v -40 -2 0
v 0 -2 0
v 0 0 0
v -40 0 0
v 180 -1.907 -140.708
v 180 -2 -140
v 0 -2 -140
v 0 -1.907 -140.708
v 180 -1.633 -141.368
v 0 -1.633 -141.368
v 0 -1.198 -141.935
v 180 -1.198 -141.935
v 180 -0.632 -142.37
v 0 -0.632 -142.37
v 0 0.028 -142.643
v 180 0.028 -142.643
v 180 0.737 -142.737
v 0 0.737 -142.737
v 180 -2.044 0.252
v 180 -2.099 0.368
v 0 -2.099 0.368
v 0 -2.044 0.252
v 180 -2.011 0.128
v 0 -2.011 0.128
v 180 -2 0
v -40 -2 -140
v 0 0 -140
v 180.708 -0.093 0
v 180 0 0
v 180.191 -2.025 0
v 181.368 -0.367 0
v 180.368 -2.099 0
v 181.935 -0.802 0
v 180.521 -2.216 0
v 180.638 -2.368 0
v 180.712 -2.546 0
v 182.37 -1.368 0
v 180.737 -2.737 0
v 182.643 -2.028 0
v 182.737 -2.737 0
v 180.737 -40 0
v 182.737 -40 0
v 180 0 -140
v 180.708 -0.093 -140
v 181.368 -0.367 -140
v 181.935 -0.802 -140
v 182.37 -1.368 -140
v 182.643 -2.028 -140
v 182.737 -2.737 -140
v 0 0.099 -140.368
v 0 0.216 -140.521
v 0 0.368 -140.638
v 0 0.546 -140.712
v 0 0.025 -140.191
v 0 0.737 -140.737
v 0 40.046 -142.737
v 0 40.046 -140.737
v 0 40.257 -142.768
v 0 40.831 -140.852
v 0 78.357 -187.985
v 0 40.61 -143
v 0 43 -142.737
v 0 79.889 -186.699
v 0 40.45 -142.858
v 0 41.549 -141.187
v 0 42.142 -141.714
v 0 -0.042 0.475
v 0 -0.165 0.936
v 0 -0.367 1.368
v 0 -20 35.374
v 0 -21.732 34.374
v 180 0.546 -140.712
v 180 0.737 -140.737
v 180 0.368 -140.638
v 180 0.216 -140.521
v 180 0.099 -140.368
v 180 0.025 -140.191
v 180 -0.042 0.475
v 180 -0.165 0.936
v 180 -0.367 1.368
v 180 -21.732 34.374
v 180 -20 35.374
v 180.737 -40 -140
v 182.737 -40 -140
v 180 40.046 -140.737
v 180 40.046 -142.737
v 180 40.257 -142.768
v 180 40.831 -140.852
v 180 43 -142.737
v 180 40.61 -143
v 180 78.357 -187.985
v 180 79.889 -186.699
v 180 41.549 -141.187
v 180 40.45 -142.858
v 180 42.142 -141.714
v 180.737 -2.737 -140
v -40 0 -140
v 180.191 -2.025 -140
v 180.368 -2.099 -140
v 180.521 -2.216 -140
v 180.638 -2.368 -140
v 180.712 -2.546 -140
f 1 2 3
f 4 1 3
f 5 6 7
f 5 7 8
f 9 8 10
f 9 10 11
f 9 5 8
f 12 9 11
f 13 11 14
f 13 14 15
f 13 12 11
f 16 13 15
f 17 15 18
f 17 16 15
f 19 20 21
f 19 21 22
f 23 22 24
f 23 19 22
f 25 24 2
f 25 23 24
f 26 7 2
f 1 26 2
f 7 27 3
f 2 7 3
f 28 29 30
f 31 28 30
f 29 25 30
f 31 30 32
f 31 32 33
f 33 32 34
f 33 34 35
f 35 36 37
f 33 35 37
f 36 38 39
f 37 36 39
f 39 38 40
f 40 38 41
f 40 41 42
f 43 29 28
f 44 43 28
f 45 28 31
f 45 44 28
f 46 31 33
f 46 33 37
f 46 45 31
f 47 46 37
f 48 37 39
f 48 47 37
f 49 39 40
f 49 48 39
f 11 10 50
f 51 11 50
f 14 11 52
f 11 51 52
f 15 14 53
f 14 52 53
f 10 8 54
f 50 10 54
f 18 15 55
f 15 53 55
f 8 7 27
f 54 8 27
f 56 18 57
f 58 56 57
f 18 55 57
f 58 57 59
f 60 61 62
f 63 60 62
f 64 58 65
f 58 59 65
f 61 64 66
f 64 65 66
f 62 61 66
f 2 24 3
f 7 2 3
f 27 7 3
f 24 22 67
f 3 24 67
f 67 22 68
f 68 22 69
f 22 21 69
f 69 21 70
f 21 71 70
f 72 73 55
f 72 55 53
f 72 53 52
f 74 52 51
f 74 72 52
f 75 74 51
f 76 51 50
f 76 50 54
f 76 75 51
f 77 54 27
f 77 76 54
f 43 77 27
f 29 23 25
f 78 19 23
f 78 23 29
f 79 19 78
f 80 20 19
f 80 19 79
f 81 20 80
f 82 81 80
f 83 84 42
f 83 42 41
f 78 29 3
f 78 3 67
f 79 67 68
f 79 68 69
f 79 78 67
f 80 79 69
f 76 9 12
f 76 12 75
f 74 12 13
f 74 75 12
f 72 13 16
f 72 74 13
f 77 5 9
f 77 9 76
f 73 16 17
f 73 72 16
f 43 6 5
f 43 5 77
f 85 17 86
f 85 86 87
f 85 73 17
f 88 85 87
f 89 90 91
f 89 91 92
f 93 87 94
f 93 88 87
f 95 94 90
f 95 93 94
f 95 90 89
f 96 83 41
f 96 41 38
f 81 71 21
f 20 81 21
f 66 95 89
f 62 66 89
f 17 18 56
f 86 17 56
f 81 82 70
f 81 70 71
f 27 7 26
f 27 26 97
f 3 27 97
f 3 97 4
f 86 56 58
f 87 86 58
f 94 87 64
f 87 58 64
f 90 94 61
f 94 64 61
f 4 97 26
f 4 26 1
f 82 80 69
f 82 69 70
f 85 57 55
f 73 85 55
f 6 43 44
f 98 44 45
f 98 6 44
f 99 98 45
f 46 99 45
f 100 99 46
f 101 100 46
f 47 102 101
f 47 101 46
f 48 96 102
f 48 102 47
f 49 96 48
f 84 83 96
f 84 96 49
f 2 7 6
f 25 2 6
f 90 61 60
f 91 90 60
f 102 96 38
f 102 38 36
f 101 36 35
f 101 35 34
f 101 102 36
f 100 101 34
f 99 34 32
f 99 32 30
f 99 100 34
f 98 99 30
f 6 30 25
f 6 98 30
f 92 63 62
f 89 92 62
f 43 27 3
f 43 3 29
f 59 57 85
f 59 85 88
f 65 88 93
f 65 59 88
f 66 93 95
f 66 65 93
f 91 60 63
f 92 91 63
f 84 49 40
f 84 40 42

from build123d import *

# Parameters (mm, degrees)
SKETCH1_W            = 180
SKETCH1_H            = 140
BASE_FLANGE2_DEPTH   = 2
EDGE_FLANGE3_DEPTH   = 140
SKETCH19_W           = 140
SKETCH19_H           = 2
BOSS_EXTRUDE1_DEPTH  = 40
EDGE_FLANGE4_DEPTH   = 180
EDGE_FLANGE5_DEPTH   = 180
EDGE_FLANGE6_DEPTH   = 180
EDGE_FLANGE6_2_DEPTH = 180


# Read off the part's stored shape, not the designer's step: Edge-Flange6
# Sheet-metal steps are written as plain solids
with BuildPart() as part:
    # Sketch1 → Base-Flange2 (new body)
    with BuildSketch(Plane(origin=(0, 0, 0), x_dir=(1, 0, 0), z_dir=(0, 1, 0))):
        with Locations((90, 70)):
            Rectangle(SKETCH1_W, SKETCH1_H)
    extrude(amount=-BASE_FLANGE2_DEPTH)

    # Edge-Flange3 section (across the edge) → Edge-Flange3 (add)
    with BuildSketch(Plane(origin=(180.7366, -2, -140), x_dir=(-1, 0, 0), z_dir=(0, 0, 1))):
        with BuildLine():
            Line((-2, 0.7366), (-2, 38))
            Line((-2, 38), (0, 38))
            Line((0, 38), (0, 0.7366))
            ThreePointArc((0, 0.7366), (0.215745145, 0.215745145), (0.7366, 0))
            Line((0.7366, 0), (0.7366, -2))
            ThreePointArc((0.7366, -2), (-1.198468417, -1.198468417), (-2, 0.7366))
        make_face()
    extrude(amount=EDGE_FLANGE3_DEPTH)

    # Edge-Flange4 section (across the edge) → Edge-Flange4 (add)
    with BuildSketch(Plane(origin=(180, -2, 0.197371375), x_dir=(0, -0.8660254037844416, -0.49999999999999495), z_dir=(-1, 0, 0))):
        with BuildLine():
            Line((-2, 0.197371375), (-2, 39.464101615))
            Line((-2, 39.464101615), (0, 39.464101615))
            Line((0, 39.464101615), (0, 0.197371375))
            ThreePointArc((0, 0.197371375), (0.025099036, 0.006725267), (0.098685688, -0.170928625))
            Line((0.098685688, -0.170928625), (-1.63336512, -1.170928625))
            ThreePointArc((-1.63336512, -1.170928625), (-1.906752616, -0.510912824), (-2, 0.197371375))
        make_face()
    extrude(amount=EDGE_FLANGE4_DEPTH)

    # Edge-Flange5 section (across the edge) → Edge-Flange5 (add)
    with BuildSketch(Plane(origin=(180, 0, -140.7366), x_dir=(0, 0, 1), z_dir=(-1, 0, 0))):
        with BuildLine():
            Line((-2, 0.7366), (-2, 43))
            Line((-2, 43), (0, 43))
            Line((0, 43), (0, 0.7366))
            ThreePointArc((0, 0.7366), (0.215745145, 0.215745145), (0.7366, 0))
            Line((0.7366, 0), (0.7366, -2))
            ThreePointArc((0.7366, -2), (-1.198468417, -1.198468417), (-2, 0.7366))
        make_face()
    extrude(amount=EDGE_FLANGE5_DEPTH)

    # Edge-Flange6 outline → Edge-Flange6 (cut)
    with BuildSketch(Plane.YZ):
        with BuildLine():
            ThreePointArc((40.0457032, -140.7366), (41.202240335, -140.99299811), (42.142060423, -141.714147427))
            Line((42.142060423, -141.714147427), (43, -142.7366))
            Line((43, -142.7366), (43, -140.7366))
            Line((43, -140.7366), (40.0457032, -140.7366))
        make_face()
    extrude(amount=EDGE_FLANGE6_DEPTH, mode=Mode.SUBTRACT)

    # Edge-Flange6 2 outline → Edge-Flange6 2 (add)
    with BuildSketch(Plane.YZ):
        with BuildLine():
            Line((79.889057319, -186.699266587), (43, -142.7366))
            Line((43, -142.7366), (40.0457032, -142.7366))
            ThreePointArc((40.0457032, -142.7366), (40.357003812, -142.805613684), (40.609971537, -142.999722647))
            Line((40.609971537, -142.999722647), (78.356968433, -187.984841807))
            Line((78.356968433, -187.984841807), (79.889057319, -186.699266587))
        make_face()
    extrude(amount=EDGE_FLANGE6_2_DEPTH)


with BuildPart() as body_2:
    # Sketch19 → Boss-Extrude1 (new body)
    with BuildSketch(Plane.ZY):
        with Locations((-70, -1)):
            Rectangle(SKETCH19_W, SKETCH19_H)
    extrude(amount=BOSS_EXTRUDE1_DEPTH)


solid = Compound([part.part, body_2.part])
